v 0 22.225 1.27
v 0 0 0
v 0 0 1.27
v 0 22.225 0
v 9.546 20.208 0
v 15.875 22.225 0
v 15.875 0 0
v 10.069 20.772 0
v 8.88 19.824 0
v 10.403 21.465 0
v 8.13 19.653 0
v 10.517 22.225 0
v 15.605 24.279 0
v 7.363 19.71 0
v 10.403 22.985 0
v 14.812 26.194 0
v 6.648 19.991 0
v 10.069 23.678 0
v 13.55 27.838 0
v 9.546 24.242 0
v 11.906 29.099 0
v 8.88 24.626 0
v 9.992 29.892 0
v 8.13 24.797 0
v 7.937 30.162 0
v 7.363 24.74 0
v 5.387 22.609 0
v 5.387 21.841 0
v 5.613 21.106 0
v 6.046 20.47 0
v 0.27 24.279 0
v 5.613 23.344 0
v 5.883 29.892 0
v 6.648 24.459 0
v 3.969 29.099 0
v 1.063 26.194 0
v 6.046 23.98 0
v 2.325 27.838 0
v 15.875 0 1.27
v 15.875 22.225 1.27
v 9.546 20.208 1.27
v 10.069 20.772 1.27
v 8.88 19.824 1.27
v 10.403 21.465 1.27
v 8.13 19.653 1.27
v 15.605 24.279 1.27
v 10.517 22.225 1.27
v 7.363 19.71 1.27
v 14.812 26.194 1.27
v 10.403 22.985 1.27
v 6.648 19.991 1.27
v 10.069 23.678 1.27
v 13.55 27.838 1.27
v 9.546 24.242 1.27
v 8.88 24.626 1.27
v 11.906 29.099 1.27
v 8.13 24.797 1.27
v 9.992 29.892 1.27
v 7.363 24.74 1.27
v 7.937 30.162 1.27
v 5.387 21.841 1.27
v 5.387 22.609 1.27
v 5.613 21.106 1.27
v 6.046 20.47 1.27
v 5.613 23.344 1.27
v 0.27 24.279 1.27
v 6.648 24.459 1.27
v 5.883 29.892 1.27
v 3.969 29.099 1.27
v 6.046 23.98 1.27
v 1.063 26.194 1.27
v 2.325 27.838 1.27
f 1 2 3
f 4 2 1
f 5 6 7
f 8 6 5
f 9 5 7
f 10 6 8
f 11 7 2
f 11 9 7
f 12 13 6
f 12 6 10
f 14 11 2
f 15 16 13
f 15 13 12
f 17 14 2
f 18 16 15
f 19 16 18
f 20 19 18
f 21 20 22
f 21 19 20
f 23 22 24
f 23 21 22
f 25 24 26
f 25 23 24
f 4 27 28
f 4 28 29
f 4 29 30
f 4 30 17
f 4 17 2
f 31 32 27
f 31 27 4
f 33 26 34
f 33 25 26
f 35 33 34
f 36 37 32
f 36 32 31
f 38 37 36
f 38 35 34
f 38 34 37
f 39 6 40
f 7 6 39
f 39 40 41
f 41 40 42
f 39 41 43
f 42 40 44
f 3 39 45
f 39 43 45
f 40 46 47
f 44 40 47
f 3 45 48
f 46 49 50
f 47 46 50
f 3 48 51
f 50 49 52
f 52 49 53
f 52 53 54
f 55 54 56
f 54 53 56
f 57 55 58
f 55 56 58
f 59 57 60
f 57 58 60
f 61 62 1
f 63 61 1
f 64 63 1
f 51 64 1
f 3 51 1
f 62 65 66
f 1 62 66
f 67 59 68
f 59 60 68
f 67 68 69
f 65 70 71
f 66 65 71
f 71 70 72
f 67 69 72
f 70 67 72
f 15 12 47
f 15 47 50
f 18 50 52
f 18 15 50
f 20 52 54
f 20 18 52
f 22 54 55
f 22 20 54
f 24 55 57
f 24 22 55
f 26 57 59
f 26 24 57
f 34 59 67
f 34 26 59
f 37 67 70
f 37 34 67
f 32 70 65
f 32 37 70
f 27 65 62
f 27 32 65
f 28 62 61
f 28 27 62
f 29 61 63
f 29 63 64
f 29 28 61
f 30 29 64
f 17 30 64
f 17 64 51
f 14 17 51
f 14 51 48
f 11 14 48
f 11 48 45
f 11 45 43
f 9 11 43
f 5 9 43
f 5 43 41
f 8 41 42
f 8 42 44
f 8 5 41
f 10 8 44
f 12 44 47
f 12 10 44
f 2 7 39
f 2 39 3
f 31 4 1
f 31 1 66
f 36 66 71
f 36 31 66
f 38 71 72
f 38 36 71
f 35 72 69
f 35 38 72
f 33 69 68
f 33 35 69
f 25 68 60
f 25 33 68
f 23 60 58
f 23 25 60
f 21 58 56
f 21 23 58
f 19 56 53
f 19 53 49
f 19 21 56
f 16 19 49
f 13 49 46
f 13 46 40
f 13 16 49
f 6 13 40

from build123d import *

# Parameters (mm, degrees)
SKETCH2_R           = 2.5796875
BOSS_EXTRUDE1_DEPTH = 1.27


with BuildPart() as part:
    # Sketch2 → Boss-Extrude1 (new body)
    with BuildSketch(Plane.XY):
        with BuildLine():
            ThreePointArc((0, 22.225), (7.9375, 30.1625), (15.875, 22.225))
            Line((15.875, 22.225), (15.875, 0))
            Line((15.875, 0), (0, 0))
            Line((0, 0), (0, 22.225))
        make_face()
        with Locations((7.9375, 22.225)):
            Circle(SKETCH2_R, mode=Mode.SUBTRACT)
    extrude(amount=BOSS_EXTRUDE1_DEPTH)


solid = part.part
